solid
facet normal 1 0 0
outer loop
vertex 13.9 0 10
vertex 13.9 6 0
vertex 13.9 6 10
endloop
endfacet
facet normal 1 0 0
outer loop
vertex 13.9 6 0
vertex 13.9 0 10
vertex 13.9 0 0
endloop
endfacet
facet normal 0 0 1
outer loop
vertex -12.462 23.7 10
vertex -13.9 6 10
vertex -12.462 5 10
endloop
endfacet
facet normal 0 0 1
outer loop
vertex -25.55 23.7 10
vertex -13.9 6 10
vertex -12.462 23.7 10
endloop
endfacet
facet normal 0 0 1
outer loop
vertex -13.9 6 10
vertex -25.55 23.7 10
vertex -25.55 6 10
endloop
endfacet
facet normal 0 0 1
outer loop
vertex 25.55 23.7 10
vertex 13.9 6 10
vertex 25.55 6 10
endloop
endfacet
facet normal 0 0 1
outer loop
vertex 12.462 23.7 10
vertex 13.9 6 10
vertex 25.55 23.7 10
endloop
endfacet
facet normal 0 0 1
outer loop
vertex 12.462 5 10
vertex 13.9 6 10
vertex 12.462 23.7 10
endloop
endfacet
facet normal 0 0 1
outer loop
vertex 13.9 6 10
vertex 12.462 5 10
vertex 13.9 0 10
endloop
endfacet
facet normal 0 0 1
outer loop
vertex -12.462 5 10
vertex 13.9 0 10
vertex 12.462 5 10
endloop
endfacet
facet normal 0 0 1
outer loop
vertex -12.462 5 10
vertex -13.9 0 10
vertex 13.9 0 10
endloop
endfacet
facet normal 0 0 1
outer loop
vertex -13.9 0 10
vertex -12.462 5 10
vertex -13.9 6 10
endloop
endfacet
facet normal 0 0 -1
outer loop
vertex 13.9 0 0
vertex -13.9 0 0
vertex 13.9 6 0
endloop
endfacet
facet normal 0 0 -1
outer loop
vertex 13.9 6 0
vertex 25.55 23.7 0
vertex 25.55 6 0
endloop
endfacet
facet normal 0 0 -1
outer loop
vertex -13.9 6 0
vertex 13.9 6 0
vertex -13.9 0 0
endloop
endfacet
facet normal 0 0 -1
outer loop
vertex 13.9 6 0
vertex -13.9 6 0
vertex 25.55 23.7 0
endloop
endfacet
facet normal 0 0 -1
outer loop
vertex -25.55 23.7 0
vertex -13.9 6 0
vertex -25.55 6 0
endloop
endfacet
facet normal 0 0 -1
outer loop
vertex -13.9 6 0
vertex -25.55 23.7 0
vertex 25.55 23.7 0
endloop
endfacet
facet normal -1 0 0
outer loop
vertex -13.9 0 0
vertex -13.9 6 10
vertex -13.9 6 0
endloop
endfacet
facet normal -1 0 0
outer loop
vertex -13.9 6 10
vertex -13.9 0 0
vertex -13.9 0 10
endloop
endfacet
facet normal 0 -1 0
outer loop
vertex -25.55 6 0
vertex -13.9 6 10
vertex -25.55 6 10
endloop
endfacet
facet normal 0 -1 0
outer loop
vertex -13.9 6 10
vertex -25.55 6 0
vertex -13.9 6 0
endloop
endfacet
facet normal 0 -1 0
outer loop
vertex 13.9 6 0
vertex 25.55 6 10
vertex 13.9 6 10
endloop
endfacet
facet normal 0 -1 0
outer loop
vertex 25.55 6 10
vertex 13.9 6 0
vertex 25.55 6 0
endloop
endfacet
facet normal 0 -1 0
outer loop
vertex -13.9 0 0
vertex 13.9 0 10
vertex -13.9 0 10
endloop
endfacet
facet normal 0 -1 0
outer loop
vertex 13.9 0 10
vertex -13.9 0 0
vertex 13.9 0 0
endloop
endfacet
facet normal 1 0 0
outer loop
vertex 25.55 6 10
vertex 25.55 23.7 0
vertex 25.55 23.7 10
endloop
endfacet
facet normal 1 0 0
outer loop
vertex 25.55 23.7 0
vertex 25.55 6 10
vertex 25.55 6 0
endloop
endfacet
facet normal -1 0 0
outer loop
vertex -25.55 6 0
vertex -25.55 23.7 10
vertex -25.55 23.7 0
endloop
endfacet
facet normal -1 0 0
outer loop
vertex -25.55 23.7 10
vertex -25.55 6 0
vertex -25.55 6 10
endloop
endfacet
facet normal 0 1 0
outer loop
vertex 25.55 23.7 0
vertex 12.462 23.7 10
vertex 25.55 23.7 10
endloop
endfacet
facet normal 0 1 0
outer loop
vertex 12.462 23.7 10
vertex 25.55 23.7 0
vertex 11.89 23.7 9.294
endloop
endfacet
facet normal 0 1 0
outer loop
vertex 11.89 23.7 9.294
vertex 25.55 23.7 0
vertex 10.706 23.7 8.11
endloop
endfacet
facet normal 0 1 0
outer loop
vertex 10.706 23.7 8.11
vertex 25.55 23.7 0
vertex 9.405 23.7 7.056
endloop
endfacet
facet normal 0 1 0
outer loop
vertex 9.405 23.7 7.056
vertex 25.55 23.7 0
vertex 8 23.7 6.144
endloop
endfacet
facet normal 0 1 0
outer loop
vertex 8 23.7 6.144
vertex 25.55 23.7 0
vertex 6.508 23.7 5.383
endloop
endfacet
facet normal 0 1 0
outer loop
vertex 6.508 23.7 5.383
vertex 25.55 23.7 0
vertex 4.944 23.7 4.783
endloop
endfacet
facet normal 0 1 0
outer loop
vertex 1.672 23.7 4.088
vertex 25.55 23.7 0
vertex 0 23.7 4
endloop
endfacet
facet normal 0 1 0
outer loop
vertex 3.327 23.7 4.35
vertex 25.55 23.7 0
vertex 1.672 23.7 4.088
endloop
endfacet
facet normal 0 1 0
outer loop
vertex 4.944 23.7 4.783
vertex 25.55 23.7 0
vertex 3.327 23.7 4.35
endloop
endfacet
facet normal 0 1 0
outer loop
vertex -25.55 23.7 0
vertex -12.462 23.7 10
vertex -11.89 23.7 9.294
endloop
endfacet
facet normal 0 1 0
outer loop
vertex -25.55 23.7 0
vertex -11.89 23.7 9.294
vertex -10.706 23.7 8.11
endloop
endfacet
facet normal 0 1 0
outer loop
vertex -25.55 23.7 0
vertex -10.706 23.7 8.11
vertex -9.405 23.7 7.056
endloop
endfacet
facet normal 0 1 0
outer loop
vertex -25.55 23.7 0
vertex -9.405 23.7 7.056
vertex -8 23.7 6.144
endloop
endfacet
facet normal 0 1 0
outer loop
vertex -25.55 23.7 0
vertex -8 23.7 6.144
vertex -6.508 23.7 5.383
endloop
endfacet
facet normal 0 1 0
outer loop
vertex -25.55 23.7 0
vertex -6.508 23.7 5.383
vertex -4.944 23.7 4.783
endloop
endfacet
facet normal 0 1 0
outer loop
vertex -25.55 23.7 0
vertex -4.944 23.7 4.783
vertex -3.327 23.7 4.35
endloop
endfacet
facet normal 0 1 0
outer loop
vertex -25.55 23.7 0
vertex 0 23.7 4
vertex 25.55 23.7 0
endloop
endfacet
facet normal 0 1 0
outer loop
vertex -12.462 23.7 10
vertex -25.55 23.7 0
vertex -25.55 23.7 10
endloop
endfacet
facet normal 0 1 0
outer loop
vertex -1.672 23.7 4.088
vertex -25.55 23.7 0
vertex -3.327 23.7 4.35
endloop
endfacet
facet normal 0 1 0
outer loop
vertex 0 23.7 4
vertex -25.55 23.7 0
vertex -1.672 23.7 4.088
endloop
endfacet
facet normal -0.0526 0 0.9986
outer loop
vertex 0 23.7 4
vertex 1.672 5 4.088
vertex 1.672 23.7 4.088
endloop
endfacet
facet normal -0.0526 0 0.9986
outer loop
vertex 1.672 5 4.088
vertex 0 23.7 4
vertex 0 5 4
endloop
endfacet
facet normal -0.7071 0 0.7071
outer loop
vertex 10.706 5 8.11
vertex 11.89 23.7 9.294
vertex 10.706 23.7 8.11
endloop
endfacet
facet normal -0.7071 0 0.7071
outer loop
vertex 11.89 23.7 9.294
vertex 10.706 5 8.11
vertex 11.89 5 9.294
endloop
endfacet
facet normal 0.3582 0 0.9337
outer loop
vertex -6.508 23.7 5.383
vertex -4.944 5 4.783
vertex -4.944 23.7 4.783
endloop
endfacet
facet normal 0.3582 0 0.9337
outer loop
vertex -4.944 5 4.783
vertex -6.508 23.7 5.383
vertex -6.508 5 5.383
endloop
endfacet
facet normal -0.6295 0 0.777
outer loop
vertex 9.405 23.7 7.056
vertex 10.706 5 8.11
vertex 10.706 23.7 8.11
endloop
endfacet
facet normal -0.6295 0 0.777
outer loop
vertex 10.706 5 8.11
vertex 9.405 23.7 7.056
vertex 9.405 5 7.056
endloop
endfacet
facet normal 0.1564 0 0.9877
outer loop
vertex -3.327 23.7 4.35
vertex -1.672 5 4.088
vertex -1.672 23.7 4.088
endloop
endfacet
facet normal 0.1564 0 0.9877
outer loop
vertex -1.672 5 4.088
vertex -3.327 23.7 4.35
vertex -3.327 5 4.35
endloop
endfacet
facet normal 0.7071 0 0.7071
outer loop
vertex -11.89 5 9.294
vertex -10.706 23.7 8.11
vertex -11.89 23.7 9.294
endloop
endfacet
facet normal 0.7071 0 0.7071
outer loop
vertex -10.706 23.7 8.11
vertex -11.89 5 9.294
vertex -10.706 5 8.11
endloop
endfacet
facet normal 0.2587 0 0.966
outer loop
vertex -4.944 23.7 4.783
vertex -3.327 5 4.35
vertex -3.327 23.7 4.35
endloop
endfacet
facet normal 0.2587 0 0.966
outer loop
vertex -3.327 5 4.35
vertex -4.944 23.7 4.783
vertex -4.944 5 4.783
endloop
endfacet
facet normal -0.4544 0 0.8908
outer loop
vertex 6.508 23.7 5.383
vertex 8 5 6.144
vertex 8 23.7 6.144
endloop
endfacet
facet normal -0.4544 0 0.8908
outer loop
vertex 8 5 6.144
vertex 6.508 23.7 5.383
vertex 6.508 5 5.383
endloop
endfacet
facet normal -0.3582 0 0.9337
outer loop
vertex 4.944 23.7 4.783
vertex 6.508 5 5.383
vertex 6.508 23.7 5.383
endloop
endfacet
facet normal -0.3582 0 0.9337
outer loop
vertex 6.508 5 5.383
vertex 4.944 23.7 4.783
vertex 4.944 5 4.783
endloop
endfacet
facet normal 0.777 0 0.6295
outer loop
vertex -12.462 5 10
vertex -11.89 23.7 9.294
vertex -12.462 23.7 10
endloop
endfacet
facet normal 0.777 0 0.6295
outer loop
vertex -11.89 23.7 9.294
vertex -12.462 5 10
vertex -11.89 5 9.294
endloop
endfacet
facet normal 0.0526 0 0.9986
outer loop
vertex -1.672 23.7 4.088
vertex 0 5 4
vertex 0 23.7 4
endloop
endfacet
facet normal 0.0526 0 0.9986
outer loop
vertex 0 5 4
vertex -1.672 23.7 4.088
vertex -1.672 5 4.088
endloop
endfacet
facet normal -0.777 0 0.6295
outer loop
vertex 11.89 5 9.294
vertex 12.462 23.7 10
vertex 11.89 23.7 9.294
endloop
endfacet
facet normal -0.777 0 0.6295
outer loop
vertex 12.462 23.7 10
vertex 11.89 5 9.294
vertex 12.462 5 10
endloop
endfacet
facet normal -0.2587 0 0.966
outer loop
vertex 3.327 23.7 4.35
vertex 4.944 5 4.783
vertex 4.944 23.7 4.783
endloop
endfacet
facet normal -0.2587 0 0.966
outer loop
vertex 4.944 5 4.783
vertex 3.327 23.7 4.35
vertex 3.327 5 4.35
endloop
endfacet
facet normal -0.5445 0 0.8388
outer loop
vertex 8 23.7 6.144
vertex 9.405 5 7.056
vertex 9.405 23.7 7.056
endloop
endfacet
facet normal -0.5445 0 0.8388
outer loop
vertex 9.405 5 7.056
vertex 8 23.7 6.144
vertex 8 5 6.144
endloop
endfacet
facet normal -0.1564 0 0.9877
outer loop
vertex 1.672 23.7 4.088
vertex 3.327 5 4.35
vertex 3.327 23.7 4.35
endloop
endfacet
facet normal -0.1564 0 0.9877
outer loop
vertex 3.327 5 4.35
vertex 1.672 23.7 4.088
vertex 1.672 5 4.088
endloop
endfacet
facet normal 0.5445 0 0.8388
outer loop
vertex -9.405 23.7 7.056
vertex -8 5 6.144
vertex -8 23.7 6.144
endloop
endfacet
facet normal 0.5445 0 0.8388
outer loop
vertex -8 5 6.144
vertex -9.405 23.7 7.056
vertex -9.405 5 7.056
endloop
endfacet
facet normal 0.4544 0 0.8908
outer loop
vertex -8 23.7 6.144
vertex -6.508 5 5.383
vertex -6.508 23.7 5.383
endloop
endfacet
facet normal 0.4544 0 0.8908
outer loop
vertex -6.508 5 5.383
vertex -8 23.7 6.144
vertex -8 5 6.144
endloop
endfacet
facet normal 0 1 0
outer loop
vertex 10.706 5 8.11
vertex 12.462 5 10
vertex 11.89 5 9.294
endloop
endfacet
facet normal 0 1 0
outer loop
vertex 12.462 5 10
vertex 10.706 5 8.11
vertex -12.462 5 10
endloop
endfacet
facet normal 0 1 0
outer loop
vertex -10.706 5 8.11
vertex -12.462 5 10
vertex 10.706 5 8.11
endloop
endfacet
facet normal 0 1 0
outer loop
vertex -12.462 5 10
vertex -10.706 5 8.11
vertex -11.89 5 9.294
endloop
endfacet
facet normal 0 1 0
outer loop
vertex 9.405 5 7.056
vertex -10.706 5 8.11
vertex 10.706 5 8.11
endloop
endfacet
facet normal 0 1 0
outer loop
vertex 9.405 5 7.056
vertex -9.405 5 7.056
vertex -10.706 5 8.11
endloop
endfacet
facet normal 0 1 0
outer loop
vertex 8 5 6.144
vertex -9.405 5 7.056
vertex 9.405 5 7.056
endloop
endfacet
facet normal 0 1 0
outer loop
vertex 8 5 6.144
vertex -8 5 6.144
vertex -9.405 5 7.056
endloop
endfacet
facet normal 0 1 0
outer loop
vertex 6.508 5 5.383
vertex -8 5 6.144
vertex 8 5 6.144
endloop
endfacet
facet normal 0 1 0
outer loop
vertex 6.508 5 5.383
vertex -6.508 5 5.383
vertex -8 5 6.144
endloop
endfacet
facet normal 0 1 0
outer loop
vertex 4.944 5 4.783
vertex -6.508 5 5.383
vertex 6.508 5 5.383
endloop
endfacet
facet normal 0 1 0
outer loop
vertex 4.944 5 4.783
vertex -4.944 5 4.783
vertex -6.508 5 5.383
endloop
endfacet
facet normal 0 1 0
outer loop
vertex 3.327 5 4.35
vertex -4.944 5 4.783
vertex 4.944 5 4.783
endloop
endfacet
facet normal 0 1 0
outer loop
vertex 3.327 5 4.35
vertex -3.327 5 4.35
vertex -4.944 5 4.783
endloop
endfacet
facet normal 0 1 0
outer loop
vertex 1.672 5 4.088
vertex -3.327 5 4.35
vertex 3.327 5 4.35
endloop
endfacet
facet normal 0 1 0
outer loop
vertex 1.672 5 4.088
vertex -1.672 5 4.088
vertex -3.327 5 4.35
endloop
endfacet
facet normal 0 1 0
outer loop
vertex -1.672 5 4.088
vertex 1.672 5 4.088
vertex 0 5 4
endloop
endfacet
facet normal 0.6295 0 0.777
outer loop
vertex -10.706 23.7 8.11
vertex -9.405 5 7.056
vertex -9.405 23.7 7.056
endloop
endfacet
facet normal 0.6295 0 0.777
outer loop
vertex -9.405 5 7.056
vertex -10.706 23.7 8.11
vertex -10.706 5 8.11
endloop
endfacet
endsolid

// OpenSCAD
DX1 = 51.1;
DX0 = 28.3 - 0.5;
DY1 = 17.7;
DY0 = 6.0;
DZ0 = 10.0;

D_TUBE = 32.0;

//$fn = 80; // overrides fs; num fragments
$fa = 6;   // minimum angle (default 12)
$fs = 0.8;  // minimum size (default 2)

difference() {
    union() {
        translate([-DX0/2, 0, 0]) cube(size=[DX0, DY0, DZ0]);
        translate([-DX1/2, DY0, 0]) cube(size=[DX1, DY1, DZ0]);
    }
    translate([0, DY0 - 1, 20.0]) rotate([-90, 0, 0]) cylinder(r=D_TUBE/2, h=100);
}
